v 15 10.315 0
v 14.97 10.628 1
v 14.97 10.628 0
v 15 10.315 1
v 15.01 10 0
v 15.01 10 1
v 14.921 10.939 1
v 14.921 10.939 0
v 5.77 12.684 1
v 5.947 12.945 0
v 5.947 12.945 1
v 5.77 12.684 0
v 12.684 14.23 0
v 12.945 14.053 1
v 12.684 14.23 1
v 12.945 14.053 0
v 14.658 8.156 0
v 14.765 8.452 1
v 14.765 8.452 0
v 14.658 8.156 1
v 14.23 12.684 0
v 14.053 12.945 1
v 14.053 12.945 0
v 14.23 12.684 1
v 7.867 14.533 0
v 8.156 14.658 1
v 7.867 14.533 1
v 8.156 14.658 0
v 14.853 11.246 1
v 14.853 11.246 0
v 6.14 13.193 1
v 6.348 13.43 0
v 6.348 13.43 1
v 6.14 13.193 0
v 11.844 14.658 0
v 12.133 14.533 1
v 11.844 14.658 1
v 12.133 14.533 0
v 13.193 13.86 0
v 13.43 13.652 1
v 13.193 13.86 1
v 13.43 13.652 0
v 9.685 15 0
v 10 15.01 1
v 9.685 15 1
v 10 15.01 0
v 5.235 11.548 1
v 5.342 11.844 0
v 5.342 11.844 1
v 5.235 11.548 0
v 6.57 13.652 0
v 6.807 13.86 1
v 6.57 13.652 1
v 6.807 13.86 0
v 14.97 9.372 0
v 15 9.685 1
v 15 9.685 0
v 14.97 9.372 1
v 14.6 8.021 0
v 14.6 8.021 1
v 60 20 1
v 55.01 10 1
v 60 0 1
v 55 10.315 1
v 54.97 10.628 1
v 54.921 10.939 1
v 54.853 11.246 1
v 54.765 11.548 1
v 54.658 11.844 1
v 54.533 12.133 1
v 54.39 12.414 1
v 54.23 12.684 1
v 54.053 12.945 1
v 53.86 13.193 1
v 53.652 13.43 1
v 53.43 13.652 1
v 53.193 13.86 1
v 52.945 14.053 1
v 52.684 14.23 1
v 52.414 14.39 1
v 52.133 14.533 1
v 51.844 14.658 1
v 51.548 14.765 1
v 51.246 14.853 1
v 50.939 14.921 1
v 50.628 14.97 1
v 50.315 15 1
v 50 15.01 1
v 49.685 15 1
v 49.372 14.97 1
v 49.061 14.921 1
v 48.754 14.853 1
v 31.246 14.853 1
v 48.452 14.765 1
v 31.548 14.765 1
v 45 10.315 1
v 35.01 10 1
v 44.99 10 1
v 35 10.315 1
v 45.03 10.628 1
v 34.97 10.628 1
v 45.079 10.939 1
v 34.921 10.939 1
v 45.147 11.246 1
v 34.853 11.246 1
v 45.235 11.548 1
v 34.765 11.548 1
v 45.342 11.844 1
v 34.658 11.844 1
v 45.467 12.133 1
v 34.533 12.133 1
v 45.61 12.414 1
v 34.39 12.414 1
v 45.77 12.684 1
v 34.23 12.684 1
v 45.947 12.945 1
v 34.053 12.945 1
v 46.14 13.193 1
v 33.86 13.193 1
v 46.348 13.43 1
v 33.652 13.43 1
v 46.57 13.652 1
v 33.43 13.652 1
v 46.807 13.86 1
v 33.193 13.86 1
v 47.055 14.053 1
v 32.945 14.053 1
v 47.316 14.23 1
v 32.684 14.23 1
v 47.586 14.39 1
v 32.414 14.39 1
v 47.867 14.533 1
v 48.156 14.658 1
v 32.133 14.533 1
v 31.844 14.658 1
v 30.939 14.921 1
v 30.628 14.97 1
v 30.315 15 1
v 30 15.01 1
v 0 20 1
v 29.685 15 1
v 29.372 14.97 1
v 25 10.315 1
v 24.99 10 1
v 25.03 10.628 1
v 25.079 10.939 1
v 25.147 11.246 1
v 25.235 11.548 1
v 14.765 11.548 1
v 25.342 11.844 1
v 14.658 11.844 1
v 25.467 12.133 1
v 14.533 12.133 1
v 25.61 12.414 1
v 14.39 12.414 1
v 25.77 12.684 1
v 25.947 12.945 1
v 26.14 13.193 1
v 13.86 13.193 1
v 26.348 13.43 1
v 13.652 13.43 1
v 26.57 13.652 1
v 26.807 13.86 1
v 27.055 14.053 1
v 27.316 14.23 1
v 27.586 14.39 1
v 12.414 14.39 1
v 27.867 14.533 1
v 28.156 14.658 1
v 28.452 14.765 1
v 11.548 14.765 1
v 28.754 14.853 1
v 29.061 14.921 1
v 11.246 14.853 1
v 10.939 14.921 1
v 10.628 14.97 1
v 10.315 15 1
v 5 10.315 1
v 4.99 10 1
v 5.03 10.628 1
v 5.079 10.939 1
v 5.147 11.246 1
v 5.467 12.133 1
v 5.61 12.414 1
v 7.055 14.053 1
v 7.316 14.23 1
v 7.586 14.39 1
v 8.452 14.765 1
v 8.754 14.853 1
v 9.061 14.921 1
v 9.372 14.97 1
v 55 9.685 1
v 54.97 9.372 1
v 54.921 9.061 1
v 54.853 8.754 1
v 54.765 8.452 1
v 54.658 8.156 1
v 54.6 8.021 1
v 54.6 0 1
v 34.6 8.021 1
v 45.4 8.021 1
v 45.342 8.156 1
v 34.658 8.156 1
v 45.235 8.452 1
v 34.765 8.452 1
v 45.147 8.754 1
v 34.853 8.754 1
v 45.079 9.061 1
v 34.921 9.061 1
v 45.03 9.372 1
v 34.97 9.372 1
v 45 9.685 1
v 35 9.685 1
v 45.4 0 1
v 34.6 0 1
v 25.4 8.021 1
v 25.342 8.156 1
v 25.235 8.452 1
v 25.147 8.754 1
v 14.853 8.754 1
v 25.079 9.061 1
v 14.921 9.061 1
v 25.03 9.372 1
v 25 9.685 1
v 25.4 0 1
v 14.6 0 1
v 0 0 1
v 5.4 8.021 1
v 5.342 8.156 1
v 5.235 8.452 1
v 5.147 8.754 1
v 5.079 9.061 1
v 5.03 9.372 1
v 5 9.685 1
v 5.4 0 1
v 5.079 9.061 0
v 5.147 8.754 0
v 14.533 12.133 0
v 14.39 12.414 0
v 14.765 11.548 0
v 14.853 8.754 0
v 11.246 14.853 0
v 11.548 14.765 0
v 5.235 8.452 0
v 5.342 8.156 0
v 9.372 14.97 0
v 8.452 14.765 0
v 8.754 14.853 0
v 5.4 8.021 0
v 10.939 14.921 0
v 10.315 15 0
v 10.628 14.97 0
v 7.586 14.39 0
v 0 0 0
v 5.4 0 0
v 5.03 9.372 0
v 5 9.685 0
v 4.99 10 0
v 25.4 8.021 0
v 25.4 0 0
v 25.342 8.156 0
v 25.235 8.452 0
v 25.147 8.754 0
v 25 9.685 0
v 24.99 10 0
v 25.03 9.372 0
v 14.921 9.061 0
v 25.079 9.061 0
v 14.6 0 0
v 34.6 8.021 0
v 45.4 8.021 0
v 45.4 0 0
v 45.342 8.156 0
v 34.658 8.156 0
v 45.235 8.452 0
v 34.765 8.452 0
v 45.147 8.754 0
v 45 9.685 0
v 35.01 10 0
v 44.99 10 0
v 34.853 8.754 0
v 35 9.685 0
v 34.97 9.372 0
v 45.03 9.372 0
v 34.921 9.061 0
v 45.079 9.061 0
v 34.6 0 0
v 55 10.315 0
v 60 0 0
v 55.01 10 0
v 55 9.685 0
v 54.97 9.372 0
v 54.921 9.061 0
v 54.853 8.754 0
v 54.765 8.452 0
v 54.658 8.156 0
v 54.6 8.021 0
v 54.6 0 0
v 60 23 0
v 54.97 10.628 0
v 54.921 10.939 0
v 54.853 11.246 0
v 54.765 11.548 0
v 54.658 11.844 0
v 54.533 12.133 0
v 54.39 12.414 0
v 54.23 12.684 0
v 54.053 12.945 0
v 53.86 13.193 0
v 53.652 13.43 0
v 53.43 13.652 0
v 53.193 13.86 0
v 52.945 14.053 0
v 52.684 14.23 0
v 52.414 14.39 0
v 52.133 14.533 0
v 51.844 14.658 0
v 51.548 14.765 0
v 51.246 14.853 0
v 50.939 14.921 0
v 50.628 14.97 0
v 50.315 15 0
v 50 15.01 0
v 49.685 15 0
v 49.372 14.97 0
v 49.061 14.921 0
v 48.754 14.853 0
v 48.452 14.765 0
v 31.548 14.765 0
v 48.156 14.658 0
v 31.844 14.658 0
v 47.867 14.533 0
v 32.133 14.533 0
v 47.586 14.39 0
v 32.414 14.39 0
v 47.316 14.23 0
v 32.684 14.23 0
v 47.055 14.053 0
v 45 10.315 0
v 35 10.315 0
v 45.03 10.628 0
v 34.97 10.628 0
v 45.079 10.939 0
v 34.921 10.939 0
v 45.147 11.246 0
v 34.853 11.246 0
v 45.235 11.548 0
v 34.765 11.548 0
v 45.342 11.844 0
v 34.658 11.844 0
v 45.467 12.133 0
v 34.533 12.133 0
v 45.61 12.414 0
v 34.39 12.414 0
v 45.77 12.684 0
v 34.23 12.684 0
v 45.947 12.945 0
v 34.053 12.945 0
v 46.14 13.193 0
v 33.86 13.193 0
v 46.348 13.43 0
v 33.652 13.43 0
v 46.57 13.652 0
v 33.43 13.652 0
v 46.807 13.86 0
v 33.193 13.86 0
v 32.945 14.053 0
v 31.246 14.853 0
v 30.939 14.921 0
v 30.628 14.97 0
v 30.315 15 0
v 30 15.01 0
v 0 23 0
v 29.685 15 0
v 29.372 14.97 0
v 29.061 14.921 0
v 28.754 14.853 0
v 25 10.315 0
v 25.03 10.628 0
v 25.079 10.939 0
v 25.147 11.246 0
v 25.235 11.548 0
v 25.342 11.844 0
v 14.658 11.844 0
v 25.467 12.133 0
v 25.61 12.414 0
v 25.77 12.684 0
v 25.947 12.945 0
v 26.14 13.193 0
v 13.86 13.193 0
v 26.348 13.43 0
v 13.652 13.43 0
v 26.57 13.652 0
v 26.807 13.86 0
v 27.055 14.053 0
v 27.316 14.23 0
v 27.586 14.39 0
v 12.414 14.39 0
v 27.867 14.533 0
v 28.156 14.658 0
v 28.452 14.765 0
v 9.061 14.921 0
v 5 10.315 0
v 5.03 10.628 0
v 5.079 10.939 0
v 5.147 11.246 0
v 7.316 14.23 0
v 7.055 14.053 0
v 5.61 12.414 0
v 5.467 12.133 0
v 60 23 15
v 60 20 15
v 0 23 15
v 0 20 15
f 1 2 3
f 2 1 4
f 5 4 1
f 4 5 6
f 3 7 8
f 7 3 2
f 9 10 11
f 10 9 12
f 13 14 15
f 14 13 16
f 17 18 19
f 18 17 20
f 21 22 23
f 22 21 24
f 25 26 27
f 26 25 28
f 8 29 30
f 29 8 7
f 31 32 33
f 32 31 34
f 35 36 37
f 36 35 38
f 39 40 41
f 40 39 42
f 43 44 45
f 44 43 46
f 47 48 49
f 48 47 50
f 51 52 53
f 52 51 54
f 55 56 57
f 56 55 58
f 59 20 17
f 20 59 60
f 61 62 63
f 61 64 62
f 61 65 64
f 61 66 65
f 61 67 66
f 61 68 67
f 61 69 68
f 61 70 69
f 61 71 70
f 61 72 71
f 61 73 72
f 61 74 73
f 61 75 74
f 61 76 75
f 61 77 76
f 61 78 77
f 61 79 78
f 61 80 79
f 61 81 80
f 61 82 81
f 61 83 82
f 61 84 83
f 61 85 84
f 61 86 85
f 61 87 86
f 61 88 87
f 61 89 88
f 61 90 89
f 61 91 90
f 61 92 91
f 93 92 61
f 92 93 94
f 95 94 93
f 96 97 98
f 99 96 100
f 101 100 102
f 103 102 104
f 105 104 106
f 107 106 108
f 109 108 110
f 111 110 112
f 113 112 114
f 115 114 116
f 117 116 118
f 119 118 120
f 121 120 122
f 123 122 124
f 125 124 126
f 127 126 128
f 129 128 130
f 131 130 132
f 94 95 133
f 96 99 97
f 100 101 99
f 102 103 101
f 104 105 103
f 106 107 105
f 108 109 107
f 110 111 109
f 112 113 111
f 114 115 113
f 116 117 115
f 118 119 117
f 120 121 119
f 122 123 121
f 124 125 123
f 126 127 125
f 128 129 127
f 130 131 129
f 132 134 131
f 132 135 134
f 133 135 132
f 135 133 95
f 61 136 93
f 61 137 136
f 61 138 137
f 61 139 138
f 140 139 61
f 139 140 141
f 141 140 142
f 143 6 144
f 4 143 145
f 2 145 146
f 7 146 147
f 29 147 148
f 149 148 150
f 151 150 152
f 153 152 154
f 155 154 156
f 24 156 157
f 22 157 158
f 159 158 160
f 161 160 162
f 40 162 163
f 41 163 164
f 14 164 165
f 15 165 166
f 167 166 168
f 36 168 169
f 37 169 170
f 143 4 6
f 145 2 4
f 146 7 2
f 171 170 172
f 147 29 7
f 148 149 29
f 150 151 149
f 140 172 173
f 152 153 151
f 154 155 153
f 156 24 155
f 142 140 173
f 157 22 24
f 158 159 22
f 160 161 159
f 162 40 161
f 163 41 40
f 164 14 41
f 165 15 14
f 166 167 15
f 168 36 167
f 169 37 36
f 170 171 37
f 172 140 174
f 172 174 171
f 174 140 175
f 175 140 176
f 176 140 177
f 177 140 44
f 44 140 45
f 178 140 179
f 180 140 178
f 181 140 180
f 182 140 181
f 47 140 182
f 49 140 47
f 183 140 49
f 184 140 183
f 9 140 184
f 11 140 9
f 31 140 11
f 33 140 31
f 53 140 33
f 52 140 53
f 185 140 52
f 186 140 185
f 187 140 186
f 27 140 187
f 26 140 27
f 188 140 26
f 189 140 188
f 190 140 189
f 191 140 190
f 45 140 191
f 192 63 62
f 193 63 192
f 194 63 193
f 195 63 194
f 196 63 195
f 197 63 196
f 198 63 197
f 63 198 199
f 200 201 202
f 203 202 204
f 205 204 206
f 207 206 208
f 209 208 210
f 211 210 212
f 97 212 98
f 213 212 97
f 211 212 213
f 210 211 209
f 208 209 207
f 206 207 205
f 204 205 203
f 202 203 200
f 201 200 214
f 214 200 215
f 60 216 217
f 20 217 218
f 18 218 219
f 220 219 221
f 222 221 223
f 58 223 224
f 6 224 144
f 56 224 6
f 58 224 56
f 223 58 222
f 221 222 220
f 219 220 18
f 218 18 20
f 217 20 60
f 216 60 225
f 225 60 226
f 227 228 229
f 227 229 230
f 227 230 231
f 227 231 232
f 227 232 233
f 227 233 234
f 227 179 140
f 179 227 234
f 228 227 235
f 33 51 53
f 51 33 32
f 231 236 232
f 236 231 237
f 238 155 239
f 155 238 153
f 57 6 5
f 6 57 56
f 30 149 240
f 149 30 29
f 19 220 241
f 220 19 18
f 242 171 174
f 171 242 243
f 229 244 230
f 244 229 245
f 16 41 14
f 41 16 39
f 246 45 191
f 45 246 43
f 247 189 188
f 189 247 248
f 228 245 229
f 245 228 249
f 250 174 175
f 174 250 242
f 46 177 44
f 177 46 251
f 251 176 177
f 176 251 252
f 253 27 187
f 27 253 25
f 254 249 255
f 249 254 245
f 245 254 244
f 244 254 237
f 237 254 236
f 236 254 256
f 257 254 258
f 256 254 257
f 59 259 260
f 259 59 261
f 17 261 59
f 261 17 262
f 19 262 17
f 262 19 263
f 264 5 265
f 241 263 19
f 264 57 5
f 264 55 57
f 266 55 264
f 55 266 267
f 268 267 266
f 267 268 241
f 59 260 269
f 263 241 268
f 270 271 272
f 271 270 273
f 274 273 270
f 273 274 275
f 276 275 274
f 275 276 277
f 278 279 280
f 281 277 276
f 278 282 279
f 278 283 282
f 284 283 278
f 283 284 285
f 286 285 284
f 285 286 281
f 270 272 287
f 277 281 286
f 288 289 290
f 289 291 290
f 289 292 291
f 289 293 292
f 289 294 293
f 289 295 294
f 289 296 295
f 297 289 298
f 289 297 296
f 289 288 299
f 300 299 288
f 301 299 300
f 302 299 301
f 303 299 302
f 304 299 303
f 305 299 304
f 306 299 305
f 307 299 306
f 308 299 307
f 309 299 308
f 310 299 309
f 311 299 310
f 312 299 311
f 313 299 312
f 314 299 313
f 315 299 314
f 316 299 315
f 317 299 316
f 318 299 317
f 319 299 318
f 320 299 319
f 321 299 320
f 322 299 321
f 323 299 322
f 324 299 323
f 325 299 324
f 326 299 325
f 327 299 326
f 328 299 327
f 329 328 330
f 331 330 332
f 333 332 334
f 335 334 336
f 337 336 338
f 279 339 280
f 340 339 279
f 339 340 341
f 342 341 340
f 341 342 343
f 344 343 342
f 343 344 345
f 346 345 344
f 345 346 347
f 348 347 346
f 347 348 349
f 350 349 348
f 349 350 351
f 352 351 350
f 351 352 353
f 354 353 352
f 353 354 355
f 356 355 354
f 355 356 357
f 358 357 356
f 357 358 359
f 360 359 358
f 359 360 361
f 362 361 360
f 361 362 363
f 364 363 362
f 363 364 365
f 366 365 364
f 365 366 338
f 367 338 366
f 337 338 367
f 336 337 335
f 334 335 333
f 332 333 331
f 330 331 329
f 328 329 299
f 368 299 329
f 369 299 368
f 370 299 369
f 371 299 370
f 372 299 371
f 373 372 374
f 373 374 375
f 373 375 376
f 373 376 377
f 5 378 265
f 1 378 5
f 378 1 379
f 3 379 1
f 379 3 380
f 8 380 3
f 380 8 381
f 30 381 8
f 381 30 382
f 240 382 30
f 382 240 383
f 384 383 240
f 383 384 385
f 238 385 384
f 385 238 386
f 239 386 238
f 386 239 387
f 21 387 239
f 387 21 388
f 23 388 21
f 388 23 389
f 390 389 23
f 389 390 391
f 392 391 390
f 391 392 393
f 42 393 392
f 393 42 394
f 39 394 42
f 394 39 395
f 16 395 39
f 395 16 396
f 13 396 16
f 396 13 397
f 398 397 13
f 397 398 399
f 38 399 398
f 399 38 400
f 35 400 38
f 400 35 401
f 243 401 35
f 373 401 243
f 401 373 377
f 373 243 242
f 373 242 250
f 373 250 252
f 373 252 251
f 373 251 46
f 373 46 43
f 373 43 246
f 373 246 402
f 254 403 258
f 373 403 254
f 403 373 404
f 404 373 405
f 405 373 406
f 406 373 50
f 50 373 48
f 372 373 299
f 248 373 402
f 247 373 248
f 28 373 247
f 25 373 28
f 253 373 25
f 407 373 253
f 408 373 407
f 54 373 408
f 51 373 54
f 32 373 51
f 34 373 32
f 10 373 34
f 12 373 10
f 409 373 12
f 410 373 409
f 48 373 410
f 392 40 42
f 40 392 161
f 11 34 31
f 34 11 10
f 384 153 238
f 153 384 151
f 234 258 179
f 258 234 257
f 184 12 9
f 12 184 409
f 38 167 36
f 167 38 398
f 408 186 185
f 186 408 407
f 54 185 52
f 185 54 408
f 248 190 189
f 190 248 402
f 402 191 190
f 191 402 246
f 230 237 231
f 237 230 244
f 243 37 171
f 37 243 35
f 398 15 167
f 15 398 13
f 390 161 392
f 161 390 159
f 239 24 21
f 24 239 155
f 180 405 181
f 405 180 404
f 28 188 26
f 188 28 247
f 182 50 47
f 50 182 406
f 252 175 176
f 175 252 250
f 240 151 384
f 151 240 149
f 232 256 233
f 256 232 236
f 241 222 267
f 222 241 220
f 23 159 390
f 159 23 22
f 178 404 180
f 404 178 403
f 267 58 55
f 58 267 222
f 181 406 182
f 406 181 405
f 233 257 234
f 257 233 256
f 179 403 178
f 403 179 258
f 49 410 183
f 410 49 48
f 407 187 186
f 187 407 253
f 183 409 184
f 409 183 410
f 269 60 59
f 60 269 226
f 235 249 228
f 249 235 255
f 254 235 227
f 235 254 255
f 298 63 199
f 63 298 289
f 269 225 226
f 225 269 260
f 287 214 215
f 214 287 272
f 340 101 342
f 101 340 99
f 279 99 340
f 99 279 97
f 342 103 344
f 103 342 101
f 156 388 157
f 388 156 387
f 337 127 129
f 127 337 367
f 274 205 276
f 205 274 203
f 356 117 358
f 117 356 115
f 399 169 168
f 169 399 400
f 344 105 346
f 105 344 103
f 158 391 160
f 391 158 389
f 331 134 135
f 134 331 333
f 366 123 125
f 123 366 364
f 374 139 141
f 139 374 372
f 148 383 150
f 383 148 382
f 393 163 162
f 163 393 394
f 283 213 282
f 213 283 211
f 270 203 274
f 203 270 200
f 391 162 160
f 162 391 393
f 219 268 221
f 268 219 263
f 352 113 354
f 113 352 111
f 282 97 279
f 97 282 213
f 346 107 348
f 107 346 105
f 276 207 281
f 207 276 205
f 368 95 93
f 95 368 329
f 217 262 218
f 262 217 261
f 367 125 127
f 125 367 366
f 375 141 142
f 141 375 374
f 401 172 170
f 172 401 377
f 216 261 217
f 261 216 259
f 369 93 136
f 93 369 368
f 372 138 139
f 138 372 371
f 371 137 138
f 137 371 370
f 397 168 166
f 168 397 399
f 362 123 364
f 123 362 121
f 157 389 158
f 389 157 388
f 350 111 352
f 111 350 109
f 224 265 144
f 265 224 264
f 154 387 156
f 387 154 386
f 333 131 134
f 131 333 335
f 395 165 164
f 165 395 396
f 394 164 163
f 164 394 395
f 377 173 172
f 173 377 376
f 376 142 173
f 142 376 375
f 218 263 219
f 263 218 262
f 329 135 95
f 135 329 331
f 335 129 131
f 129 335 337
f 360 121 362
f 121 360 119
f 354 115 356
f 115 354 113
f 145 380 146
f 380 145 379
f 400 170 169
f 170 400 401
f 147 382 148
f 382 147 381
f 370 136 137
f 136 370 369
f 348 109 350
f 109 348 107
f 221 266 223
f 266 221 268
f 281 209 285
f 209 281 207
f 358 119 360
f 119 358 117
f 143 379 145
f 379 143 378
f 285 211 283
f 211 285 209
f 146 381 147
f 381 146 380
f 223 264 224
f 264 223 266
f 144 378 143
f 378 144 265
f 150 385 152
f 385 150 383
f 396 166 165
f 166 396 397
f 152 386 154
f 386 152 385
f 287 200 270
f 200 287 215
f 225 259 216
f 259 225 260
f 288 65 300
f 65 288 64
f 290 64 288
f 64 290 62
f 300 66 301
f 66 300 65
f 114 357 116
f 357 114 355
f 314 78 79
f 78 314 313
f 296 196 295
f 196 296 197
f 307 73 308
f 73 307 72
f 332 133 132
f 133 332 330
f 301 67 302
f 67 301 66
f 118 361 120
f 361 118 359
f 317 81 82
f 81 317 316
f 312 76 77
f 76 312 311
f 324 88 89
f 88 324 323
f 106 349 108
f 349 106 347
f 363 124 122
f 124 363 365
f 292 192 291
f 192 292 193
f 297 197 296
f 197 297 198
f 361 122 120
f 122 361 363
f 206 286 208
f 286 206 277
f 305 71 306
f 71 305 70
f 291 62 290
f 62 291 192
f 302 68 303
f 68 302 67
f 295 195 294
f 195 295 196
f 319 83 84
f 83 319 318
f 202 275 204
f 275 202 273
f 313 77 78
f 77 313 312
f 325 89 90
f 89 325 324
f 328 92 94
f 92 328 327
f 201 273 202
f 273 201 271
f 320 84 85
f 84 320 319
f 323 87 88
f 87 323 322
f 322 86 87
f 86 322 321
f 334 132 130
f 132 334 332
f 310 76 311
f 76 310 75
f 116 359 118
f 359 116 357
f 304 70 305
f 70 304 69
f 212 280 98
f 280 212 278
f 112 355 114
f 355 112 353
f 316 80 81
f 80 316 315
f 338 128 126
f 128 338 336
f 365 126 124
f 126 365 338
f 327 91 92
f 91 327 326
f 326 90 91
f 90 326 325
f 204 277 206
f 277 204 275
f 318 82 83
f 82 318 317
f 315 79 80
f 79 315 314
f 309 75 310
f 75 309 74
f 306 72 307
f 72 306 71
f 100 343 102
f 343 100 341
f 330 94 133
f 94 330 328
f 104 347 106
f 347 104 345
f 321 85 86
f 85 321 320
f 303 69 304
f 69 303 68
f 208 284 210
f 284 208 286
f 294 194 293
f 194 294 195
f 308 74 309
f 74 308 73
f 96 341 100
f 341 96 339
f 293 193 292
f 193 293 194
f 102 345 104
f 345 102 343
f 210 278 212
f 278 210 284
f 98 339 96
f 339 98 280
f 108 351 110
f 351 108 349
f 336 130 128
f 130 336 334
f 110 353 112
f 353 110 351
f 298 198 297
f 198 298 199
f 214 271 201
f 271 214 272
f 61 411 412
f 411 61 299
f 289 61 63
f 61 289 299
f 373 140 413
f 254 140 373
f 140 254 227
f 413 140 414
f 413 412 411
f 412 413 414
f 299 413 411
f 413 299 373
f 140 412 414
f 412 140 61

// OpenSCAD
$fn = 100;

function tol(value, tolerance = 0.5) = value + tolerance;

module Cutout() {
    translate([10, 10, 0]) cylinder(h = 1, d = tol(9.52), center = false);
    translate([10 - (tol(8.7) / 2), 0, 0]) cube([tol(8.7), 10, 1], center = false);
}

union() {
    difference() {
        cube([60, tol(20), 1], center = false);
        translate([0, 0, 0]) Cutout();
        translate([20, 0, 0]) Cutout();
        translate([40, 0, 0]) Cutout();
    }
    translate([0, 20, 0]) cube([60, 3, 15]);
}
